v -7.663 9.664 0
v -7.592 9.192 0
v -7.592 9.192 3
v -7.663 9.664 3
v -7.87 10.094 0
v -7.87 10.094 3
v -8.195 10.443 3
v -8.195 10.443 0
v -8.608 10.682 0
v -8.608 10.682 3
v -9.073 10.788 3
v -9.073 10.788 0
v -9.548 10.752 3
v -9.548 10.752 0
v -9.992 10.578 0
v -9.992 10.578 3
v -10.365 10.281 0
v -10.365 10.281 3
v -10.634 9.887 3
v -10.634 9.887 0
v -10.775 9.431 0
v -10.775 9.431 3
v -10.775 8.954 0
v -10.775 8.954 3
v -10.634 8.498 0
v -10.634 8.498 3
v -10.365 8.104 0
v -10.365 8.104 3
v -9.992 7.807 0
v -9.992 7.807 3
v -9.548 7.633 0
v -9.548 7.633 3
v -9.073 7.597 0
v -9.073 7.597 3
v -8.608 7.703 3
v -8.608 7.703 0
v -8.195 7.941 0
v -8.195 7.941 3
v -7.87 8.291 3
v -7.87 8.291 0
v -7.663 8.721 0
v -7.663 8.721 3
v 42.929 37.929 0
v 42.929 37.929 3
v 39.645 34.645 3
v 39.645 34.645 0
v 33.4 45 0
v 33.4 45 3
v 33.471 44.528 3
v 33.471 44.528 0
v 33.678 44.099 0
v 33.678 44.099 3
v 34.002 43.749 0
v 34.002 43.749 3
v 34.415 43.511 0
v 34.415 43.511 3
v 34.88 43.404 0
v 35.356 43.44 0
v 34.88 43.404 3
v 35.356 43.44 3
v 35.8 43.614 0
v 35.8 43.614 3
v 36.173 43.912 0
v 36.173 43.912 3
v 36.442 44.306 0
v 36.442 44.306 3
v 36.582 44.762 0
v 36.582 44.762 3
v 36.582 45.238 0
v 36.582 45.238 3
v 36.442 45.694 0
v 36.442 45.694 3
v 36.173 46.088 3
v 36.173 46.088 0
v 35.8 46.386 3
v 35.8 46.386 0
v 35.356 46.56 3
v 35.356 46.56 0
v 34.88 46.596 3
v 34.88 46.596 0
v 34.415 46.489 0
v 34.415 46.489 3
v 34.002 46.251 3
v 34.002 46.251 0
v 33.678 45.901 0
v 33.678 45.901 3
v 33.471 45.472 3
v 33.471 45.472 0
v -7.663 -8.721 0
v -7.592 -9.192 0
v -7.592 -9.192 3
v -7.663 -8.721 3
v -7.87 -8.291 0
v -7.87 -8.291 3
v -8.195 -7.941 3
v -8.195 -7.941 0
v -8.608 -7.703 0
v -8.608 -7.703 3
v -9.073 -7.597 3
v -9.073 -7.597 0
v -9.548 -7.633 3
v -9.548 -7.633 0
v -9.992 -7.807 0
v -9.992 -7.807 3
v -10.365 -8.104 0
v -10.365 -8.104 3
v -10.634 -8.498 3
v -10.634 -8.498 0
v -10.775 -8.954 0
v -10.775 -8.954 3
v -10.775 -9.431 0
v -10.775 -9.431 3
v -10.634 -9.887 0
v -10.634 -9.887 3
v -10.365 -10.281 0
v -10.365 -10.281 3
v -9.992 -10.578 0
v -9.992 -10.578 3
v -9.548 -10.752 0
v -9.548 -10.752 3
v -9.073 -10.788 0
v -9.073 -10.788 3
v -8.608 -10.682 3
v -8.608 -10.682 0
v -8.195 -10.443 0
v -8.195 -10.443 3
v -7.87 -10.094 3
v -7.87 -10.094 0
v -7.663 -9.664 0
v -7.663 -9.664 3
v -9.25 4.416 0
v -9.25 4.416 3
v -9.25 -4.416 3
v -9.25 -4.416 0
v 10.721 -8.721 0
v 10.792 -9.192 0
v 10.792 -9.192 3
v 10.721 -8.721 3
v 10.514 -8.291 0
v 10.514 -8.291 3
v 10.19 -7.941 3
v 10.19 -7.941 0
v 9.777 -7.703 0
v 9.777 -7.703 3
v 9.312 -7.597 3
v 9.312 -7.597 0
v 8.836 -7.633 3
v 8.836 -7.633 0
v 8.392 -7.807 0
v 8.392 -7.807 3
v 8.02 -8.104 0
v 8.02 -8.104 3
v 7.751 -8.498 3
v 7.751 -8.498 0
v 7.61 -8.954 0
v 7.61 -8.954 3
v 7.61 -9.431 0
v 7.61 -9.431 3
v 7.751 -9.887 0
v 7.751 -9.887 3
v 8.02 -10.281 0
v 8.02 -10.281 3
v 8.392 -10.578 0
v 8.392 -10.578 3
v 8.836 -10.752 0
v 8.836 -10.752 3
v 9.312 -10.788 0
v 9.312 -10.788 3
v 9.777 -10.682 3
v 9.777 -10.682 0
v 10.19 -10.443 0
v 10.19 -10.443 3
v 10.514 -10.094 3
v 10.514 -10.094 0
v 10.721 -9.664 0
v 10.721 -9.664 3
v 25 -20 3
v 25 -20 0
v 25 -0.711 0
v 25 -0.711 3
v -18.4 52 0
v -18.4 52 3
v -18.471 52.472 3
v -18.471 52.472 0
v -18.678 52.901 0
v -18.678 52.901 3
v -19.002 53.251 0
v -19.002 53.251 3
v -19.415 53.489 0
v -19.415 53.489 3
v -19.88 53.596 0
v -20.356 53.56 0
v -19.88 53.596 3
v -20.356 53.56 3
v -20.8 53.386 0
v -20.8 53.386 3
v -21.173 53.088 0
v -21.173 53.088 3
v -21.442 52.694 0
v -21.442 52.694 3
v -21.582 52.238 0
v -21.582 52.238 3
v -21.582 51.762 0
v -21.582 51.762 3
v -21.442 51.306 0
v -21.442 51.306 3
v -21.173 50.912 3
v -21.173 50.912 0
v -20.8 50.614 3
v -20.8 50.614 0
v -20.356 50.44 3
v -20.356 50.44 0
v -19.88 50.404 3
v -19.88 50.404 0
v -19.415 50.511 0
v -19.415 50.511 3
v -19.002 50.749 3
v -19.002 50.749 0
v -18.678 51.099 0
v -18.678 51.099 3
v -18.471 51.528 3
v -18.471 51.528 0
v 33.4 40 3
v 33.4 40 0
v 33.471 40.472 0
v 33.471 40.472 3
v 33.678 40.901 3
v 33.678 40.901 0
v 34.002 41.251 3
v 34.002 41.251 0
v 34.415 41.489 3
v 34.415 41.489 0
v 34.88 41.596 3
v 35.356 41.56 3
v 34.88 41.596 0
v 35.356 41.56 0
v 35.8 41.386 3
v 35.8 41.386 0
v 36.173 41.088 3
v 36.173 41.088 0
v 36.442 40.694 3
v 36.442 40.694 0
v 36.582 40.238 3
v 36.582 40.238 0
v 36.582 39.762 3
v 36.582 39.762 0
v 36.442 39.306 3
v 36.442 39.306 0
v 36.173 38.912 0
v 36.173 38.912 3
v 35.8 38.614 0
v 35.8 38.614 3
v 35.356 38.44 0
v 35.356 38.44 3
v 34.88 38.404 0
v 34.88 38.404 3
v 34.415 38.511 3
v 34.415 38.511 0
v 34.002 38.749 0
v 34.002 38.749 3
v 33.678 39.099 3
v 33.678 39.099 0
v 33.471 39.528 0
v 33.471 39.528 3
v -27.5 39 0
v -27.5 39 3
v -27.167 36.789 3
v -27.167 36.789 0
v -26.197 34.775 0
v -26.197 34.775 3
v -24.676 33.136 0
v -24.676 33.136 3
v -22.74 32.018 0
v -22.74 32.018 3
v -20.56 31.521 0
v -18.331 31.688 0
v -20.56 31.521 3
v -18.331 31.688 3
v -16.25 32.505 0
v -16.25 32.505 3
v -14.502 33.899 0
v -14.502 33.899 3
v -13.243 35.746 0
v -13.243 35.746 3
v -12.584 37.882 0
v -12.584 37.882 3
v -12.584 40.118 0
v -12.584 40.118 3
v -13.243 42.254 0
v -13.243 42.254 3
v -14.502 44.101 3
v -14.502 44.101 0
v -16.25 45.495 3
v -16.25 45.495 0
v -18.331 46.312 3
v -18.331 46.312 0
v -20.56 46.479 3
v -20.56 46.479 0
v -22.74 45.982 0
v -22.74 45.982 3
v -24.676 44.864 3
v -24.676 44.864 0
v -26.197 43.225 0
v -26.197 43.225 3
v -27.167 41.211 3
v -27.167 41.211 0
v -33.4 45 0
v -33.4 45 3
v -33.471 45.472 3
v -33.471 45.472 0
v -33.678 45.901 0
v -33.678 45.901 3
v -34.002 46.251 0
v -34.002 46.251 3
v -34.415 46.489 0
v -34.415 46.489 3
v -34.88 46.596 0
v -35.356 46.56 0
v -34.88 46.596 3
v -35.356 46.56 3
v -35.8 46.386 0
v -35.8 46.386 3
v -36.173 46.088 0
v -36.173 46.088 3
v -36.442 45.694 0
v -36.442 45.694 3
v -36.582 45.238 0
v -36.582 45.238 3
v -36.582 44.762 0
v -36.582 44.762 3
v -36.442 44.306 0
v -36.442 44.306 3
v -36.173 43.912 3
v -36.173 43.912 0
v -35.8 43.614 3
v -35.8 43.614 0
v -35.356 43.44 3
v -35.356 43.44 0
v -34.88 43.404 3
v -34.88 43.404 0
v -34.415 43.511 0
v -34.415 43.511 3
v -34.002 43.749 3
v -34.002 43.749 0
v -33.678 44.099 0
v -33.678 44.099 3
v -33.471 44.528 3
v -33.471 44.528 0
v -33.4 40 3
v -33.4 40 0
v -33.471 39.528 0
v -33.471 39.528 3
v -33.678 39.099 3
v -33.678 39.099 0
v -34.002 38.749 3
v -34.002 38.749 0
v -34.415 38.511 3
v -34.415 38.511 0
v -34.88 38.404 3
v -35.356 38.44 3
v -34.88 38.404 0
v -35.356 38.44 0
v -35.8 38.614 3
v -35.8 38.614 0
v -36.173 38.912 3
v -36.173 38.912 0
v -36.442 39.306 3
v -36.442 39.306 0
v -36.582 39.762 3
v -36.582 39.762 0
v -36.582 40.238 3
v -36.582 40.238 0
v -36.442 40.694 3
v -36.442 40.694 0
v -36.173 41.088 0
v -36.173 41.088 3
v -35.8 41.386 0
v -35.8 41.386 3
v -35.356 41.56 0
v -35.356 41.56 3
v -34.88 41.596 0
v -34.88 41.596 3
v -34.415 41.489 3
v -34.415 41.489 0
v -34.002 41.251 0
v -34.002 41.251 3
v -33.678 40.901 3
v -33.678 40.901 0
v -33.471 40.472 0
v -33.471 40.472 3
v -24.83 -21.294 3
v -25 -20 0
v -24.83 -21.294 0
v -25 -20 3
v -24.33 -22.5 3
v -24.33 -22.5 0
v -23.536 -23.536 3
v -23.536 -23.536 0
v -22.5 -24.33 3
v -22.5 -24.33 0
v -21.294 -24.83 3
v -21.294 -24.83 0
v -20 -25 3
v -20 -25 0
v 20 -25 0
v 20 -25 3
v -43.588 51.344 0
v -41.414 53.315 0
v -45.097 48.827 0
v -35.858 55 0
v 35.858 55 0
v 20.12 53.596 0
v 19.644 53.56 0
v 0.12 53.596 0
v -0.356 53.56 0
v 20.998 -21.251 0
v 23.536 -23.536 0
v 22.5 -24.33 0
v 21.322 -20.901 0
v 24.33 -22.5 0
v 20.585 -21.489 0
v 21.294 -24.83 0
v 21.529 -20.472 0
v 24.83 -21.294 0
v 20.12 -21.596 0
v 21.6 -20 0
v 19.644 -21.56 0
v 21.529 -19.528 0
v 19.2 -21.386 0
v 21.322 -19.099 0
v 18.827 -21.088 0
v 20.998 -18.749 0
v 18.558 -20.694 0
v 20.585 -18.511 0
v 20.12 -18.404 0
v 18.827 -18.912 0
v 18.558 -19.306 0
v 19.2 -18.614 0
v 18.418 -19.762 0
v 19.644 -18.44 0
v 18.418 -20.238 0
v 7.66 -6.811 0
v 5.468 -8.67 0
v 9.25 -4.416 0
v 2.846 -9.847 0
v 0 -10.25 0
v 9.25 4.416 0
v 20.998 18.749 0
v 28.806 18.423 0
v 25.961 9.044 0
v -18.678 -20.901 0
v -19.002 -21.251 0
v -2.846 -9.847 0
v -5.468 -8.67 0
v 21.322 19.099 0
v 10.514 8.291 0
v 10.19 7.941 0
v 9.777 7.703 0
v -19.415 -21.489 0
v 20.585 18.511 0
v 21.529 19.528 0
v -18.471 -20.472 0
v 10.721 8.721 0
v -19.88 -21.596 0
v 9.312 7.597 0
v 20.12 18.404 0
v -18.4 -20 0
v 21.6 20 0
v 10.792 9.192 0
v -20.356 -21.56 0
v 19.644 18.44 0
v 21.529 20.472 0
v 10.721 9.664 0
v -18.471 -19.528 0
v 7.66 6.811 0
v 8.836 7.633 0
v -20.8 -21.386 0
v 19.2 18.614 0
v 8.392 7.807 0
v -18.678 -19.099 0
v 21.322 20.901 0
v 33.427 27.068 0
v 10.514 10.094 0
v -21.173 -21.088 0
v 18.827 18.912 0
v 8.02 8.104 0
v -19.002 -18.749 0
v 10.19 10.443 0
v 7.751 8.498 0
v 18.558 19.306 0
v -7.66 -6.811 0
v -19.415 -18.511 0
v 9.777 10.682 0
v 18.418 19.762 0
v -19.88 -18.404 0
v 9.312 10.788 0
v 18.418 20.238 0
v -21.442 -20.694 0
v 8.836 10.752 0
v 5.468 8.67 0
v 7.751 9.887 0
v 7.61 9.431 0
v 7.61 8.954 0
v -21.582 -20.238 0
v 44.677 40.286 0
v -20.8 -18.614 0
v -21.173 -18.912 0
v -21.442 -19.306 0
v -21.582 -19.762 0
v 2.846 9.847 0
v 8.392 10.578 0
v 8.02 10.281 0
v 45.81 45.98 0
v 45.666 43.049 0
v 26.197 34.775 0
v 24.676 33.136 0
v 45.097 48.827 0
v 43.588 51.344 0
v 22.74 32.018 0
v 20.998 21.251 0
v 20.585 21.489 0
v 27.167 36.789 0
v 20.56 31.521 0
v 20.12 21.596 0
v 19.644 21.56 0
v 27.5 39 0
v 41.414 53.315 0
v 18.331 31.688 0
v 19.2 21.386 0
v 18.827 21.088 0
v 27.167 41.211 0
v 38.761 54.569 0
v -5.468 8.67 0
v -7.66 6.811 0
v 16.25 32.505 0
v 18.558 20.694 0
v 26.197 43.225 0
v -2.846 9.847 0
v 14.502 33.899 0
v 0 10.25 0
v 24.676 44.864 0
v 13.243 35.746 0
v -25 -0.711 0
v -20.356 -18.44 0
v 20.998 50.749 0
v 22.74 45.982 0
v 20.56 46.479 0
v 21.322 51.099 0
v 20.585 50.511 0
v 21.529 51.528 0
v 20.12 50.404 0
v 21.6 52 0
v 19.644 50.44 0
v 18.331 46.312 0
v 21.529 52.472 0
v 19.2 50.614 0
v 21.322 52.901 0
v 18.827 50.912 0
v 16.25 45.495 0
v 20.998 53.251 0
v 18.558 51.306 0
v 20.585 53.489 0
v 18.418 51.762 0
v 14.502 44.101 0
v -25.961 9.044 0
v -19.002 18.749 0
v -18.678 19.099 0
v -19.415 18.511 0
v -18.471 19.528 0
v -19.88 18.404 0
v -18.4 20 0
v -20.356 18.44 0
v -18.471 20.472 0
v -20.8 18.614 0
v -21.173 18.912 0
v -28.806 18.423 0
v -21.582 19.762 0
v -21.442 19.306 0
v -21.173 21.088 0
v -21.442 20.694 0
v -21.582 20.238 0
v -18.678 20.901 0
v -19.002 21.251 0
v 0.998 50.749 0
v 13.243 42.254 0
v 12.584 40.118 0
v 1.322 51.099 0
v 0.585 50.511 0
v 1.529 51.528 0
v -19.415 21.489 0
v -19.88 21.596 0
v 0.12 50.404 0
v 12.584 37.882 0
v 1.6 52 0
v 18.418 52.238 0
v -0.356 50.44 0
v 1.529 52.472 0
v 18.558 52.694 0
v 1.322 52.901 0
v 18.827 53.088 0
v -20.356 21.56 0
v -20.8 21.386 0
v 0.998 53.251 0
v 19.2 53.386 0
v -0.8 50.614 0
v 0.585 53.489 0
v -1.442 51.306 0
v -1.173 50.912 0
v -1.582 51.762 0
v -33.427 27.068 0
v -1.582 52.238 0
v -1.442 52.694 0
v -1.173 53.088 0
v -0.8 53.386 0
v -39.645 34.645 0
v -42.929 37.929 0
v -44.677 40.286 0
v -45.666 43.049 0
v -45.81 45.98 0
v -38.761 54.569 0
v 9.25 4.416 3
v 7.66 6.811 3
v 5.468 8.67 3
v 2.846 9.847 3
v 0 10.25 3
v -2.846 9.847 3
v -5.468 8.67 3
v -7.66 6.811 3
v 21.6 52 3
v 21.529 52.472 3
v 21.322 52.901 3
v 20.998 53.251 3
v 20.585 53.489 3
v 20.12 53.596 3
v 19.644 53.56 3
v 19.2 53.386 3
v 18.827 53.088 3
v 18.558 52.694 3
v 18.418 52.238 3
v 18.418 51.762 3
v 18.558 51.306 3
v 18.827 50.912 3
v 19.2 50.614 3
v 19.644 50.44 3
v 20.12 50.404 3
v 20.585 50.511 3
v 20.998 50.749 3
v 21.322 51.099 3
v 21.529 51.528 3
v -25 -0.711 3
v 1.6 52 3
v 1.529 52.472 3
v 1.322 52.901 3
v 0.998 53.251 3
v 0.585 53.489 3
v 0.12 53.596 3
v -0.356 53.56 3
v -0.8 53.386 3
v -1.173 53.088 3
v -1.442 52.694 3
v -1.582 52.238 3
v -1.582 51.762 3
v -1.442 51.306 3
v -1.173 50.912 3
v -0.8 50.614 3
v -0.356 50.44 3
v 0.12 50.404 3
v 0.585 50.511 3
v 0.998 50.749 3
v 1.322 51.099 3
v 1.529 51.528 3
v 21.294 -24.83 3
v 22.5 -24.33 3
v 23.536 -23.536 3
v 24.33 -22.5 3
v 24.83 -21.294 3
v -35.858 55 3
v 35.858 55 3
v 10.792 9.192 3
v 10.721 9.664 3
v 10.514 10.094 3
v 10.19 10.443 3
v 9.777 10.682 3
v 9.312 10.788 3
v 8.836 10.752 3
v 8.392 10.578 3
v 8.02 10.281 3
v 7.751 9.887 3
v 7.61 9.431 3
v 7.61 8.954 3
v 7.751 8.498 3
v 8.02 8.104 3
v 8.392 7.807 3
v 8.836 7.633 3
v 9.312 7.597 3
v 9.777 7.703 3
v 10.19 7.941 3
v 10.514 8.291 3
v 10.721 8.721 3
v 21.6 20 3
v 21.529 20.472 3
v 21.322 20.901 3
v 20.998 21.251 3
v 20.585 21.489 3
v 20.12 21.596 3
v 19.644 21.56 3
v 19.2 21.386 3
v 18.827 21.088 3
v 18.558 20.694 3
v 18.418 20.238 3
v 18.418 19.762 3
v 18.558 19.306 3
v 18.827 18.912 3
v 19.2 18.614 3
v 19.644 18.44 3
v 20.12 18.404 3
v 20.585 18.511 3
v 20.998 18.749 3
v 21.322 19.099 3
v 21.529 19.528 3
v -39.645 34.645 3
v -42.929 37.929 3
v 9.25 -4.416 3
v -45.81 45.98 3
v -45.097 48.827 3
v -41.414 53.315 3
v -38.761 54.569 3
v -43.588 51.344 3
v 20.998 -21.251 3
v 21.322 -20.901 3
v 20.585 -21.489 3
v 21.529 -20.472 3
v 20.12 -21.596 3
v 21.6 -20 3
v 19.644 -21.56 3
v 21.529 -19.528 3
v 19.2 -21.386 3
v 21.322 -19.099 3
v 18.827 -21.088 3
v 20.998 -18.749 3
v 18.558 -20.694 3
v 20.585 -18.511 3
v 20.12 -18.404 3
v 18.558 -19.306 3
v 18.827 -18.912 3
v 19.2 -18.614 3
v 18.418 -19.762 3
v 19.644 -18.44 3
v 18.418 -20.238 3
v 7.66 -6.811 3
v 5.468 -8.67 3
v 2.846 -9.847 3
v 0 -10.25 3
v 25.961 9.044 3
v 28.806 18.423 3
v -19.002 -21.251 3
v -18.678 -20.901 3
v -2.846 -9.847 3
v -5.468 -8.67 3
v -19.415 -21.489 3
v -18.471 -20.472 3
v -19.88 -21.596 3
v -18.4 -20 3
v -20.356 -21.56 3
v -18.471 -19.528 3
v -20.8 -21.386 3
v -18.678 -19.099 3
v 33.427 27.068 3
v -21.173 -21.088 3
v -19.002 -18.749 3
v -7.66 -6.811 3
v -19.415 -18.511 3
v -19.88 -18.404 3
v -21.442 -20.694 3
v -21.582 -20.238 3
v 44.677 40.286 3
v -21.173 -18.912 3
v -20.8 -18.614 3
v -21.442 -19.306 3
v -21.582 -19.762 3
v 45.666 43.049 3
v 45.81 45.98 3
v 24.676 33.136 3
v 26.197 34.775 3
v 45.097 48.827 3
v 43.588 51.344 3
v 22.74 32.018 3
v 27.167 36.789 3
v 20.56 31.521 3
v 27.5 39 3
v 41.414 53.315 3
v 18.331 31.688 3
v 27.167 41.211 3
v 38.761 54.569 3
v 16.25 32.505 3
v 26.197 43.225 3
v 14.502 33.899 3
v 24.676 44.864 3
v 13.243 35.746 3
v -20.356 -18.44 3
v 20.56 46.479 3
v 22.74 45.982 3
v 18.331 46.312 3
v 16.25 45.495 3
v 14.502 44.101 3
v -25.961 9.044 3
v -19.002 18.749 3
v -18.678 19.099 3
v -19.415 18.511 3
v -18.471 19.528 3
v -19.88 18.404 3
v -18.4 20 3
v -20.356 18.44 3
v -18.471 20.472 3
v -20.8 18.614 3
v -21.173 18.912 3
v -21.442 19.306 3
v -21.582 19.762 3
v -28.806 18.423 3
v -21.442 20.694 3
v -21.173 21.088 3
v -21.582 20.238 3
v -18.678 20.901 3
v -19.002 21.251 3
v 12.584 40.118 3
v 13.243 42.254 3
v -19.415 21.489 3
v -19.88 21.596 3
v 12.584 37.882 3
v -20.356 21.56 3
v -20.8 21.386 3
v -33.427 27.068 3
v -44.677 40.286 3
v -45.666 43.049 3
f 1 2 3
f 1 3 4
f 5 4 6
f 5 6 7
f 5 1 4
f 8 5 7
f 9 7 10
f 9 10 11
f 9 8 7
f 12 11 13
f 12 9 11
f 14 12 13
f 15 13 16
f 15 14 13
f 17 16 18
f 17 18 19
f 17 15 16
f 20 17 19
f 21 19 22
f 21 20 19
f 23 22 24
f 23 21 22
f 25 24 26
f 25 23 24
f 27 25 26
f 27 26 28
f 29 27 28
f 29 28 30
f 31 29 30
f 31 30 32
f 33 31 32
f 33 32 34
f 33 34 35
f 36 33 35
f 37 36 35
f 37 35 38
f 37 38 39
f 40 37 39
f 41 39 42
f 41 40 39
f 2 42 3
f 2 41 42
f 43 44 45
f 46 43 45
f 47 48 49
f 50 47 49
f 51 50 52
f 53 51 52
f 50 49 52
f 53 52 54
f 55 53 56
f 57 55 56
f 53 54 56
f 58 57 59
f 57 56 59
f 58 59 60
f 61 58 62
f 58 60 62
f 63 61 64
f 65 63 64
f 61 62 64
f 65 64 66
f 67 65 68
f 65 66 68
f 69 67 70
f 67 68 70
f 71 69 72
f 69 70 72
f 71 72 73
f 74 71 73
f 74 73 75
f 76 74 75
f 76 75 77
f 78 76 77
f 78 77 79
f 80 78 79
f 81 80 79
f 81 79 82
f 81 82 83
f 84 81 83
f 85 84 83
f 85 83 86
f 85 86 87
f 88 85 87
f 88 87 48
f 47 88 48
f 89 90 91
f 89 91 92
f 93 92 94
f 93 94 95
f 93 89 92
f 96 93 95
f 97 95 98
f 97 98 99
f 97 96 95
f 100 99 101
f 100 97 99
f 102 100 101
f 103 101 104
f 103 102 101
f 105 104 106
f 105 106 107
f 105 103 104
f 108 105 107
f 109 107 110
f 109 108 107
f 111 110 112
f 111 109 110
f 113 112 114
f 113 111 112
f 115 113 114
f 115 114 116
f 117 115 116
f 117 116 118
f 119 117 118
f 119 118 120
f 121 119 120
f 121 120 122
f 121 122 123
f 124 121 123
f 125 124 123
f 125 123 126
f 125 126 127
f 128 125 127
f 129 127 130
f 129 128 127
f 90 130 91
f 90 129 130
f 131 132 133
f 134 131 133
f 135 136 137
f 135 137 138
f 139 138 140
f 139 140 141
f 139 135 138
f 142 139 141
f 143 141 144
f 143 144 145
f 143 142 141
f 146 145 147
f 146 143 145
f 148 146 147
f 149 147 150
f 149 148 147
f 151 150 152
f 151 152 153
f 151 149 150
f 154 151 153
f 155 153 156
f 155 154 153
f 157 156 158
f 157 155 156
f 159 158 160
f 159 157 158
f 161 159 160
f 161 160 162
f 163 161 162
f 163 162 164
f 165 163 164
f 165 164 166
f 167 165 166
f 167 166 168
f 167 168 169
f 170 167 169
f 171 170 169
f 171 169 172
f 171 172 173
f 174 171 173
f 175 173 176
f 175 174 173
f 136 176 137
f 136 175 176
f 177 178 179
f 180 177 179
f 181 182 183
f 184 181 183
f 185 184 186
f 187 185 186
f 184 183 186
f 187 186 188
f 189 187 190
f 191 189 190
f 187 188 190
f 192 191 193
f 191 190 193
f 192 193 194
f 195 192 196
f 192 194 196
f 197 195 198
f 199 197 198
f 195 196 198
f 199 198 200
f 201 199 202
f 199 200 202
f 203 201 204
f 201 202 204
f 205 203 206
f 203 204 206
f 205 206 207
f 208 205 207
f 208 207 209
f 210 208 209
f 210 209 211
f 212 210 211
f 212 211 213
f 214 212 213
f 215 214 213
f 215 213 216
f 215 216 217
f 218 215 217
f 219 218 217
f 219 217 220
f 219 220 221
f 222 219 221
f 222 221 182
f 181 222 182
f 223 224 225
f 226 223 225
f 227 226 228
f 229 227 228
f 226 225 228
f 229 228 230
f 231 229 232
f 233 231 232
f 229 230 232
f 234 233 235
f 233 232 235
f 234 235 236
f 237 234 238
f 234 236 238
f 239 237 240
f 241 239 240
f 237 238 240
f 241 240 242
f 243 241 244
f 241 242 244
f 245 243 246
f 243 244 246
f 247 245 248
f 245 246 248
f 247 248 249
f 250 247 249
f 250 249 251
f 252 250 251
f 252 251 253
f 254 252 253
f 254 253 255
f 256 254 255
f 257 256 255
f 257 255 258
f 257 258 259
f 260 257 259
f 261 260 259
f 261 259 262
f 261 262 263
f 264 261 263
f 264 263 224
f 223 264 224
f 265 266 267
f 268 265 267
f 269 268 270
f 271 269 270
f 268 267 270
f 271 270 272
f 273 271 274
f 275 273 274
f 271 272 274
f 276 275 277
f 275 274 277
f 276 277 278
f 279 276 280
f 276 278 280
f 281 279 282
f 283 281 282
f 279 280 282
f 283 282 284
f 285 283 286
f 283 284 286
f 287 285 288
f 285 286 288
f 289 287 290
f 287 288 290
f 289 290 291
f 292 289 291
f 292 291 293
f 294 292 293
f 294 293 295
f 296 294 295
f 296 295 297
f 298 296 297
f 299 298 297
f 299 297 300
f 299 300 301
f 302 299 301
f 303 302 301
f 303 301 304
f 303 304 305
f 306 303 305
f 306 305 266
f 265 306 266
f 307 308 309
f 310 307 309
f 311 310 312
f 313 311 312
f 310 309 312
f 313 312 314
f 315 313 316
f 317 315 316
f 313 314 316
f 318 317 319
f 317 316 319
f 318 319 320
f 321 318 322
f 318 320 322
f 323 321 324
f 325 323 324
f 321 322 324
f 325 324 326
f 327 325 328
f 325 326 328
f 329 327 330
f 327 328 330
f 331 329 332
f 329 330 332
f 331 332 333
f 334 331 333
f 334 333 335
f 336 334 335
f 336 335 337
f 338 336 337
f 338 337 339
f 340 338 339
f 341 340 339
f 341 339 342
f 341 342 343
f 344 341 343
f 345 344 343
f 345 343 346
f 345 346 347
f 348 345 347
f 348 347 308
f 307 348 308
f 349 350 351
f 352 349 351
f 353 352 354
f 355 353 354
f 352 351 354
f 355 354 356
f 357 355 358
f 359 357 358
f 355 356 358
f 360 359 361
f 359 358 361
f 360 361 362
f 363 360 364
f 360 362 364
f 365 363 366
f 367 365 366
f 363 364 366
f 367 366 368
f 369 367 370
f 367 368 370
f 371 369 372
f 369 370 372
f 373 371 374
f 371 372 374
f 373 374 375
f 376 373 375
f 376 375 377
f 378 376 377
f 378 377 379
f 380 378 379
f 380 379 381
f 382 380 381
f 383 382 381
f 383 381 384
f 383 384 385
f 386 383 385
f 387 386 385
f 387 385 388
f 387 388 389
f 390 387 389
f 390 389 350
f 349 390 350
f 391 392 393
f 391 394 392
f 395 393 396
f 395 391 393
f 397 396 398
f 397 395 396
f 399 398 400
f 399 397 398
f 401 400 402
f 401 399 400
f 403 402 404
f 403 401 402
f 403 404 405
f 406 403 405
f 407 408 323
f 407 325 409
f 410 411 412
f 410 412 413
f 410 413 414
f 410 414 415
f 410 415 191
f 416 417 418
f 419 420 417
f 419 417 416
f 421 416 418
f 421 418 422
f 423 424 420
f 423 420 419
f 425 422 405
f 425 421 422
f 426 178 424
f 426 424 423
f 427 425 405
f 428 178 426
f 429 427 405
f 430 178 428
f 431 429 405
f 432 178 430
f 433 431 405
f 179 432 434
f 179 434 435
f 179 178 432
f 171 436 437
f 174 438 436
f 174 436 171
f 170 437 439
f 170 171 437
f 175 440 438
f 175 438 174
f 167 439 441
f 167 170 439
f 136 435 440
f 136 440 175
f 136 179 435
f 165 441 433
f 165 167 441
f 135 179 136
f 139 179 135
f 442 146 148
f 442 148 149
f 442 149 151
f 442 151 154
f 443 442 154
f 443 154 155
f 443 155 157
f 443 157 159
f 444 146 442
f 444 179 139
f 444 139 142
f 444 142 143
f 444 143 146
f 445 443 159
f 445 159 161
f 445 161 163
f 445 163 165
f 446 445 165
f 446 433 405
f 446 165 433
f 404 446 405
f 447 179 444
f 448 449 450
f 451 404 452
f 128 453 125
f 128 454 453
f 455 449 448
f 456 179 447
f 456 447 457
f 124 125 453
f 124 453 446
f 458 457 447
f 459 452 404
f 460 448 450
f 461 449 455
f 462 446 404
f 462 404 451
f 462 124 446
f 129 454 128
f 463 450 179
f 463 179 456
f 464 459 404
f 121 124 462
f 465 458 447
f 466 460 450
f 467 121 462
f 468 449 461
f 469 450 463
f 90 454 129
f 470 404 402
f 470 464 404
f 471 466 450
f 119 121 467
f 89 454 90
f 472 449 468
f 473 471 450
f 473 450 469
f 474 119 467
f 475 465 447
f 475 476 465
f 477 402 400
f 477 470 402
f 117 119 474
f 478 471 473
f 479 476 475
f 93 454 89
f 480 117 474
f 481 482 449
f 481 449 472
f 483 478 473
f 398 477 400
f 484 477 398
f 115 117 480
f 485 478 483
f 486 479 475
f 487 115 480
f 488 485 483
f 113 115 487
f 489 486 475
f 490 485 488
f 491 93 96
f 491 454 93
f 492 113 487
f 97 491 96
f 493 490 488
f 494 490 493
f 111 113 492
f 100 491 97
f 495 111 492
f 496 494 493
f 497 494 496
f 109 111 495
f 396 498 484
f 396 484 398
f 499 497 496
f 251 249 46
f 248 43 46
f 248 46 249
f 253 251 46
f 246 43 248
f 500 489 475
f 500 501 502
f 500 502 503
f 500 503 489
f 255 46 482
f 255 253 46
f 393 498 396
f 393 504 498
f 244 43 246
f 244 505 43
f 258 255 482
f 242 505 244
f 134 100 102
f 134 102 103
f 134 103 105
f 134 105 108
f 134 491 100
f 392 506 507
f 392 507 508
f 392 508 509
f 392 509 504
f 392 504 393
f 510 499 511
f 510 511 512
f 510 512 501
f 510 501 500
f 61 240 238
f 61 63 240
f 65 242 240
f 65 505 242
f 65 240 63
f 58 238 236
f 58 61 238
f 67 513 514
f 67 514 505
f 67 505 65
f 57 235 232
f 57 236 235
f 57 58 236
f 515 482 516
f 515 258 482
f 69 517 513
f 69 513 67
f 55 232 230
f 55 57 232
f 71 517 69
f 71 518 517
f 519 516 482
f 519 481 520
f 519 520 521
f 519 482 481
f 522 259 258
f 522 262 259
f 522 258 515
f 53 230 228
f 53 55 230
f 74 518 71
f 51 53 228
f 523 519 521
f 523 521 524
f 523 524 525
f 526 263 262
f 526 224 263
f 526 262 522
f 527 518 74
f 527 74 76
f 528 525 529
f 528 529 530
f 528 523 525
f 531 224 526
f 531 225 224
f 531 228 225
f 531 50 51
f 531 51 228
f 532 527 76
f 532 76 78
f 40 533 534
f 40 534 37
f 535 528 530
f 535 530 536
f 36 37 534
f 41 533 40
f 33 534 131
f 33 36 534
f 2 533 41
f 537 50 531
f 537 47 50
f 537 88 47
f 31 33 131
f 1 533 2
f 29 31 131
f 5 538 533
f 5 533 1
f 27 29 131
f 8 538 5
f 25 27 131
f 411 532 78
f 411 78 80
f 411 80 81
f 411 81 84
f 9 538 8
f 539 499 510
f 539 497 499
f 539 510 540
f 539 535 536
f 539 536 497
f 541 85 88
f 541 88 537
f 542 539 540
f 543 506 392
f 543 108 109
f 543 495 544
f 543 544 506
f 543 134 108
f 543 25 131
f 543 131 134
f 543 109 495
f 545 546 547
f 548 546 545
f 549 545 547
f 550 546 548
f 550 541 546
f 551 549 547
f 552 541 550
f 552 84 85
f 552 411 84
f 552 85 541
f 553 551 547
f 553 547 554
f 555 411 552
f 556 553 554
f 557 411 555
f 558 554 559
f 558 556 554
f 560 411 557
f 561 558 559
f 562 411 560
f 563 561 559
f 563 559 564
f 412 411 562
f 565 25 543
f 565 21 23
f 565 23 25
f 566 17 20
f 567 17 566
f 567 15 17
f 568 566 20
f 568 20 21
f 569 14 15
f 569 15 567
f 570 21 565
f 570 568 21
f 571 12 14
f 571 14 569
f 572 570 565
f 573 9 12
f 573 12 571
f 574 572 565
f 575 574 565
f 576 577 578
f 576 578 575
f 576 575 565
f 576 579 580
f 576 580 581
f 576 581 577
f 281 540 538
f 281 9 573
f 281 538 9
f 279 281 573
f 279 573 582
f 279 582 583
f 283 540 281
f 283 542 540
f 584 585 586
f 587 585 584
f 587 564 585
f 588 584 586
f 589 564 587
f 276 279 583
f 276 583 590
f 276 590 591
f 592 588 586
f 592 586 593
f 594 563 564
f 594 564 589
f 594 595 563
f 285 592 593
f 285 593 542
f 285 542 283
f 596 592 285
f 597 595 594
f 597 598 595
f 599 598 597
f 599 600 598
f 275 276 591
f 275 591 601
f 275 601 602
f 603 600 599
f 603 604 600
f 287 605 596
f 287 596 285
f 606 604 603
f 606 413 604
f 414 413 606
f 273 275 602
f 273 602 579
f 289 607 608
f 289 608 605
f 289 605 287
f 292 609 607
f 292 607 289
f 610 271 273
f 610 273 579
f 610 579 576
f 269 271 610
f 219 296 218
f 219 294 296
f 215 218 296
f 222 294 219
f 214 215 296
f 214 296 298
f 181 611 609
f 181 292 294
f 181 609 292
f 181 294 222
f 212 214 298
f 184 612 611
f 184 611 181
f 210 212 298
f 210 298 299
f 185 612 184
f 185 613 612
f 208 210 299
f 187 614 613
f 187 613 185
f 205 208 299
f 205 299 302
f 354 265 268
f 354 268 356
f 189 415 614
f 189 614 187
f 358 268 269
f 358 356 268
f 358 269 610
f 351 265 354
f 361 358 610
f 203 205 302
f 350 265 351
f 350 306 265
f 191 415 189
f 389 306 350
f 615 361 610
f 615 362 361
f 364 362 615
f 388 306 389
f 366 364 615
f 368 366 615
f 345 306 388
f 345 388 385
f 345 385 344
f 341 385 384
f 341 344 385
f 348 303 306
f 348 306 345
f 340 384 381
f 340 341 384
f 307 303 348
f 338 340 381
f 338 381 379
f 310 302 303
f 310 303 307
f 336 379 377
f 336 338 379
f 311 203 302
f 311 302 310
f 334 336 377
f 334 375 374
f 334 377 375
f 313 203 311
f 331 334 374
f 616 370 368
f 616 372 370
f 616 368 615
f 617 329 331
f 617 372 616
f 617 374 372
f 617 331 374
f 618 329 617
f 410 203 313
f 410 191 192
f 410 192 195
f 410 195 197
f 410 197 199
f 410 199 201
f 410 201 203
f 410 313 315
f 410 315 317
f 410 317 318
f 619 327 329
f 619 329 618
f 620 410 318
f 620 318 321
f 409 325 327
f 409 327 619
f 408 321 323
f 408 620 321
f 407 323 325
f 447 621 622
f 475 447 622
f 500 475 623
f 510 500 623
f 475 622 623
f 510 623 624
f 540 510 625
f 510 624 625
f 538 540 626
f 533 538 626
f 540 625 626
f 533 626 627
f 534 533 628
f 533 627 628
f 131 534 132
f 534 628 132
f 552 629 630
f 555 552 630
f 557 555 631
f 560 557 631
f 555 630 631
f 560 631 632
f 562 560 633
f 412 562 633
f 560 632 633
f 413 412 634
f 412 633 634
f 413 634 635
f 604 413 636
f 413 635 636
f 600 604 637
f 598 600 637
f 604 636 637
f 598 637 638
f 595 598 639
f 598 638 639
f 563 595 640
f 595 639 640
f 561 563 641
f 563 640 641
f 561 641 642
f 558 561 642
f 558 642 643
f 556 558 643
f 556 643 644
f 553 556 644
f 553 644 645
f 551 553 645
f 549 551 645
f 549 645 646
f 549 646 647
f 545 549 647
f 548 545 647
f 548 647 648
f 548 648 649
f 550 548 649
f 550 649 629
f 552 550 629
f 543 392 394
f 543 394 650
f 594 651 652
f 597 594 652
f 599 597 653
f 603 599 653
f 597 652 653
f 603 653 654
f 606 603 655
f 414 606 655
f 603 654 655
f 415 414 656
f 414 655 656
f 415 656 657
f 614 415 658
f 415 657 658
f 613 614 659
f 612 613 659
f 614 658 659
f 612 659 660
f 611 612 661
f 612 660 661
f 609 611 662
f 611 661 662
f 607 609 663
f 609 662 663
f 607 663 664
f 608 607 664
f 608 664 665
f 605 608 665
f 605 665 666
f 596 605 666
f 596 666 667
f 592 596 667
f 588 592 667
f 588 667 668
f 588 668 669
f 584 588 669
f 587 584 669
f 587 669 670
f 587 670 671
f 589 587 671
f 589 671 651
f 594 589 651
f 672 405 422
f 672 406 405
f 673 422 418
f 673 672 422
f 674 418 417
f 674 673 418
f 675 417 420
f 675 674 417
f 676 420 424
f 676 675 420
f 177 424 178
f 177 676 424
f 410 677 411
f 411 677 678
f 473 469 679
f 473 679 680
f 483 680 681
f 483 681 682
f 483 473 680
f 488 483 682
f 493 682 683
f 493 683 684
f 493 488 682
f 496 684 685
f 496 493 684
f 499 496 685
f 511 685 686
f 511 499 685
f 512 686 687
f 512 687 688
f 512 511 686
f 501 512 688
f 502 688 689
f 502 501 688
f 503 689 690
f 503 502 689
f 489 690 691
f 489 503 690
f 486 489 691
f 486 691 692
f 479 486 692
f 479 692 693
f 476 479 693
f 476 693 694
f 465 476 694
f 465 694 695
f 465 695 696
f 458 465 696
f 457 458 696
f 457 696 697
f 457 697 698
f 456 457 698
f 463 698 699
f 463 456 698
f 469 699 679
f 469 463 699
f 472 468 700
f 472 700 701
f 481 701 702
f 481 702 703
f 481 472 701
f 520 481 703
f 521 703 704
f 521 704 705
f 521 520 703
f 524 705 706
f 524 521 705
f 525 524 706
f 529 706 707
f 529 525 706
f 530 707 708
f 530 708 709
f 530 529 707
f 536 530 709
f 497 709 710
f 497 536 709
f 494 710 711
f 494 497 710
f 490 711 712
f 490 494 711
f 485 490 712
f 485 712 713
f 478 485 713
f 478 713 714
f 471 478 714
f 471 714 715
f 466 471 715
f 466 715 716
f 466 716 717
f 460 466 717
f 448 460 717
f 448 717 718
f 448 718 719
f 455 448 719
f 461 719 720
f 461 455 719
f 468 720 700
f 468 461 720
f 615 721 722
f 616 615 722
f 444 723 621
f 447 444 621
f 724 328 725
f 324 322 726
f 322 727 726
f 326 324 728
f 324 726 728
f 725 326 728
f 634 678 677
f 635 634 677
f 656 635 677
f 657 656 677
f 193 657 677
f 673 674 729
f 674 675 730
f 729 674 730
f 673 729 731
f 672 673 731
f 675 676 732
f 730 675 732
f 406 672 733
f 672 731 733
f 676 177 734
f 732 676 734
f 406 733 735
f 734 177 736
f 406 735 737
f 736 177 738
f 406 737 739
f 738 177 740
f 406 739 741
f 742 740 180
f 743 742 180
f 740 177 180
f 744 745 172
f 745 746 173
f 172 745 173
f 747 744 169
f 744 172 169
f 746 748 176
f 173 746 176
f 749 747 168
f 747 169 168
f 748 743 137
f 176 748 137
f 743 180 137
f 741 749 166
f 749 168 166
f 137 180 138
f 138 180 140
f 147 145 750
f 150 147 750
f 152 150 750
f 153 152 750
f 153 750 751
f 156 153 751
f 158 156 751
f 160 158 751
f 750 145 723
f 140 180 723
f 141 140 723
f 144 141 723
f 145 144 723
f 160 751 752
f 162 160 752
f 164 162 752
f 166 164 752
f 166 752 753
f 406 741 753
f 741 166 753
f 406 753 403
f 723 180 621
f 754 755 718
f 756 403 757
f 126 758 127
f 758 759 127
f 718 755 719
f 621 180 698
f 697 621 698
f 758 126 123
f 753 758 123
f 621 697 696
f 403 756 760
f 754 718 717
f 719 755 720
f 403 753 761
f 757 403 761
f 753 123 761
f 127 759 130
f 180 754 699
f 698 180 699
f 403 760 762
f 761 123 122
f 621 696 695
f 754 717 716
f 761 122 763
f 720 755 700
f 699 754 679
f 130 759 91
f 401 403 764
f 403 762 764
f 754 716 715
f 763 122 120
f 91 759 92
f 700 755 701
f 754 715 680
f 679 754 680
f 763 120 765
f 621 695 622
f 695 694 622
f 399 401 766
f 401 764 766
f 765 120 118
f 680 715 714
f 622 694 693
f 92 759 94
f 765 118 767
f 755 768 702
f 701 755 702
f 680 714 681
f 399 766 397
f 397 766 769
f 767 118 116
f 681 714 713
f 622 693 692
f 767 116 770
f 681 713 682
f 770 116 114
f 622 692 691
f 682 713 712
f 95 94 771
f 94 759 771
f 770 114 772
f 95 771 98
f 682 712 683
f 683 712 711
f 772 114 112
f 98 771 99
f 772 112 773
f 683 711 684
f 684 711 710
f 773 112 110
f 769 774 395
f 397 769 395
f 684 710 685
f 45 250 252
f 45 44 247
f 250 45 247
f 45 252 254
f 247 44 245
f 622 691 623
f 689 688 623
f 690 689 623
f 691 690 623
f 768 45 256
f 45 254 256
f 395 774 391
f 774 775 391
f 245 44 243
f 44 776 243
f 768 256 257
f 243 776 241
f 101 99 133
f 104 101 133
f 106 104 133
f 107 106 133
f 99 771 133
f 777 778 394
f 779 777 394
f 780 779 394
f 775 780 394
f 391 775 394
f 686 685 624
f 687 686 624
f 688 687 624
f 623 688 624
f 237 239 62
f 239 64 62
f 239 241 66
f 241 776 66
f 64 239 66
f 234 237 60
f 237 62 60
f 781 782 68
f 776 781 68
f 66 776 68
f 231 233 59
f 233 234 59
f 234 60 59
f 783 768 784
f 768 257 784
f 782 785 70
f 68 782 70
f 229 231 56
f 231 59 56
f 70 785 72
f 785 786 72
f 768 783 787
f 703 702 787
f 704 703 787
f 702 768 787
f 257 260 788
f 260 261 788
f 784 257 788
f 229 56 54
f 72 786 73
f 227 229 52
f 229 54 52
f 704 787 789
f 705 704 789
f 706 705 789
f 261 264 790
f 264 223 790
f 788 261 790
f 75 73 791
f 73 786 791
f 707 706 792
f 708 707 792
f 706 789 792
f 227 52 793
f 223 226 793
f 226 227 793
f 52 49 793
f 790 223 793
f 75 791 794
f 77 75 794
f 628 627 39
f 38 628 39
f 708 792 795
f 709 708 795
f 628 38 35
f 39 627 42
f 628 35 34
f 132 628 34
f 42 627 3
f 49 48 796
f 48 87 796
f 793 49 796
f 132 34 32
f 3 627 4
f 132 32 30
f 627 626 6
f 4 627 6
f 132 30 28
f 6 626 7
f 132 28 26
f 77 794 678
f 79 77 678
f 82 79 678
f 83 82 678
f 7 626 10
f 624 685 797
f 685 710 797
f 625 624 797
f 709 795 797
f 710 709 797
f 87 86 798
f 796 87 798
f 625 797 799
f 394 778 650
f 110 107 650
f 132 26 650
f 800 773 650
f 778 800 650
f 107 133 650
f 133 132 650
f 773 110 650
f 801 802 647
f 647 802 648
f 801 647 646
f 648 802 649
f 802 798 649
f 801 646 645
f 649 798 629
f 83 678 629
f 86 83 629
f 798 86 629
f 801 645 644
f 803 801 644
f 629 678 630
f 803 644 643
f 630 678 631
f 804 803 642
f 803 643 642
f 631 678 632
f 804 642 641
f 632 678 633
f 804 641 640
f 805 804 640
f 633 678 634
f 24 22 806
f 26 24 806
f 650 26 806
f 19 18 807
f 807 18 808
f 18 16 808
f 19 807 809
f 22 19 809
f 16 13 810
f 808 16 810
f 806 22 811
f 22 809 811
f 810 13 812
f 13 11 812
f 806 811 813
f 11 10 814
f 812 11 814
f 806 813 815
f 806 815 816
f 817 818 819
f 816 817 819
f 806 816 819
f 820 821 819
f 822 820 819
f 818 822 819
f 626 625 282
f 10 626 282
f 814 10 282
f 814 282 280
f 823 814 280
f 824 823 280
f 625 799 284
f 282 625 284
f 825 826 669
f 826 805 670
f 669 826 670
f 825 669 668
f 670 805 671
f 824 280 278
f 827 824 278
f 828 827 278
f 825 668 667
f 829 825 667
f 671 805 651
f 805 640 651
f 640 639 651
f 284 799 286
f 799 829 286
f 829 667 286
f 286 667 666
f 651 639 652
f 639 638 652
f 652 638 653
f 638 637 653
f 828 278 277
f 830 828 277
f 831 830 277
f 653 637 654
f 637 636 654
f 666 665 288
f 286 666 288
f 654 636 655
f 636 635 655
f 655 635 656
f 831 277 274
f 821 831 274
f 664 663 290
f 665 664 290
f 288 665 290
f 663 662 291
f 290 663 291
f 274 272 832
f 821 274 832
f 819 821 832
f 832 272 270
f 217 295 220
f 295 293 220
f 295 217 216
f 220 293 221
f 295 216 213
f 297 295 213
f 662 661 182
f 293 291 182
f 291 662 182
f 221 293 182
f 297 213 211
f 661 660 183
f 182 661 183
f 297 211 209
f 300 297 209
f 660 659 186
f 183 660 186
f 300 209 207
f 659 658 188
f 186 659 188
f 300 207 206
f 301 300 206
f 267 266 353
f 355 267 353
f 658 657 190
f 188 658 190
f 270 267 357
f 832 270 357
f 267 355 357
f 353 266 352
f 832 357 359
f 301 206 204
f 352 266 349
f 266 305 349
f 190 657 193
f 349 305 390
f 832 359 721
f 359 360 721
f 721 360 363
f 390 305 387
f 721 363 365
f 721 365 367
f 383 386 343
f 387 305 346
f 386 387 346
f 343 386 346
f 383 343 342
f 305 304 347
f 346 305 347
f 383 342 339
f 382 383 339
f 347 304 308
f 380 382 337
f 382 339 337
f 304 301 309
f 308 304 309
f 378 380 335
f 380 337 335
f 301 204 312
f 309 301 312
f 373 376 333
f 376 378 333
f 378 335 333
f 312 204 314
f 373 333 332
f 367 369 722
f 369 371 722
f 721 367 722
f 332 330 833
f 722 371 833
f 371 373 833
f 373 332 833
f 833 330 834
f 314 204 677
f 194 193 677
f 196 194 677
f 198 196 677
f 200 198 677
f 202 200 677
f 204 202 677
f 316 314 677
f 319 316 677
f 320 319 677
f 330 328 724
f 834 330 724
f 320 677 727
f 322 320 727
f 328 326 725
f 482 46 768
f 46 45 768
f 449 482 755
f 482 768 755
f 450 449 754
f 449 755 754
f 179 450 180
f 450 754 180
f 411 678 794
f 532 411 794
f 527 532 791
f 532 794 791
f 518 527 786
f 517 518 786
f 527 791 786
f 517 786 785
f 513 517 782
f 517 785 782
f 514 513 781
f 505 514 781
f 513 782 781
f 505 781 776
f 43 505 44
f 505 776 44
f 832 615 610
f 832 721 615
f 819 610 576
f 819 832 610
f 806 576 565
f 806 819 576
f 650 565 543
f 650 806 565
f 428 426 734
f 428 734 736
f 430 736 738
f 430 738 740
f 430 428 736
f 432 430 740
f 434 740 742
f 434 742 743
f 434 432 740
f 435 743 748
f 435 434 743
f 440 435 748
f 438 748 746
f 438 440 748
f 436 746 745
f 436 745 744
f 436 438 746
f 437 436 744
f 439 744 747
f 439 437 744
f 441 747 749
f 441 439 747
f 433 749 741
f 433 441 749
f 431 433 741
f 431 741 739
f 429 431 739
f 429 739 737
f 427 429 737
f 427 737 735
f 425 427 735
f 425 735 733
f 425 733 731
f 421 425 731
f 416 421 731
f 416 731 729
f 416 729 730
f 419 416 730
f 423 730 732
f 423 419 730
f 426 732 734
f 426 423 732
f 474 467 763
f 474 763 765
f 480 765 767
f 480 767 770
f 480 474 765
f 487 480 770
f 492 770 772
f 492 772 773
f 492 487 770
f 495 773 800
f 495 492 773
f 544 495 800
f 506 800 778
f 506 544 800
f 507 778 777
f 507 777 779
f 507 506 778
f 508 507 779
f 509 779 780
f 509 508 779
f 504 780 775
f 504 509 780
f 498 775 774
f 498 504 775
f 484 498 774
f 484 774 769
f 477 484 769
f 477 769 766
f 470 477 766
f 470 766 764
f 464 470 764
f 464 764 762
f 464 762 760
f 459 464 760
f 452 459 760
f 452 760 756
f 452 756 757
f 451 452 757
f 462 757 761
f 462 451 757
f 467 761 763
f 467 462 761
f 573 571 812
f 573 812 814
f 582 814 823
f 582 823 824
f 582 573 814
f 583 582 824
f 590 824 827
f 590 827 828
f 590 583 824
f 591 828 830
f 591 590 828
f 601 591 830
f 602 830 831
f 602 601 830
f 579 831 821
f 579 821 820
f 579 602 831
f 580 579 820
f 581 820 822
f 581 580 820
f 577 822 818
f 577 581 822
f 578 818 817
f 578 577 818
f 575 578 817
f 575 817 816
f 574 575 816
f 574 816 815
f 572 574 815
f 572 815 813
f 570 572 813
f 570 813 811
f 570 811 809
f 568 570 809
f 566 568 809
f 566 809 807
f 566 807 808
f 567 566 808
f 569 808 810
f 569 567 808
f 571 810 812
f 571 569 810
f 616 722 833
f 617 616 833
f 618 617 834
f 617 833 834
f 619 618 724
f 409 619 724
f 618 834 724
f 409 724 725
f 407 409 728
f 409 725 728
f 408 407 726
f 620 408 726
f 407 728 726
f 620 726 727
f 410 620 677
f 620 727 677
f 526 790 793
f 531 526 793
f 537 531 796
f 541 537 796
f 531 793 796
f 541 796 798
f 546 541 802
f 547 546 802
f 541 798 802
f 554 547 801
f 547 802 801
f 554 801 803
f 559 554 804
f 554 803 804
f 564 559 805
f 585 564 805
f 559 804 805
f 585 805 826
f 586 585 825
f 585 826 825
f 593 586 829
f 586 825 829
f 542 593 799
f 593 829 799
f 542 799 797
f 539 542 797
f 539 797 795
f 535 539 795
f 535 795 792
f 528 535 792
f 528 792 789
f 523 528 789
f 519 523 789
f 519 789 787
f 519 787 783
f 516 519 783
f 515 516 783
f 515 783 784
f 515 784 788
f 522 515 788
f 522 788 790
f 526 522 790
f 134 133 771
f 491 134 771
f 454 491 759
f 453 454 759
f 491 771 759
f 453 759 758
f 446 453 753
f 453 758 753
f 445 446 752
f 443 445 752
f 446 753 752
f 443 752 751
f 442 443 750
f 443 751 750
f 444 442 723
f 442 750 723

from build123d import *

# Parameters (mm, degrees)
SKETCH_1_W          = 50
SKETCH_1_H          = 50
SKETCH_1_R          = 1.6
EXTRUDE_1_DEPTH     = 3
FILLET_1_R          = 5
CUT_EXTRUDE_1_DEPTH = 36.482389998
EXTRUDE_2_DEPTH     = 3
FILLET_2_R          = 50
SKETCH_4_R          = 1.6
CUT_EXTRUDE_2_DEPTH = 72.672475366
SKETCH_5_R          = 7.5
CUT_EXTRUDE_3_DEPTH = 72.672475366
SKETCH_6_R          = 1.6
CUT_EXTRUDE_4_DEPTH = 72.672475366
SKETCH_7_R          = 1.6
CUT_EXTRUDE_5_DEPTH = 72.672475366


with BuildPart() as part:
    # ｽｹｯﾁ1 → ﾎﾞｽ - 押し出し1 (new body)
    with BuildSketch(Plane.XY):
        Rectangle(SKETCH_1_W, SKETCH_1_H)
        with Locations((-20, 20)):
            Circle(SKETCH_1_R, mode=Mode.SUBTRACT)
        with Locations((-9.192388155, 9.192388155)):
            Circle(SKETCH_1_R, mode=Mode.SUBTRACT)
        with Locations((9.192388155, 9.192388155)):
            Circle(SKETCH_1_R, mode=Mode.SUBTRACT)
        with Locations((20, 20)):
            Circle(SKETCH_1_R, mode=Mode.SUBTRACT)
        with Locations((9.192388155, -9.192388155)):
            Circle(SKETCH_1_R, mode=Mode.SUBTRACT)
        with Locations((20, -20)):
            Circle(SKETCH_1_R, mode=Mode.SUBTRACT)
        with Locations((-9.192388155, -9.192388155)):
            Circle(SKETCH_1_R, mode=Mode.SUBTRACT)
        with Locations((-20, -20)):
            Circle(SKETCH_1_R, mode=Mode.SUBTRACT)
    extrude(amount=EXTRUDE_1_DEPTH)

    # ﾌｨﾚｯﾄ1
    fillet_1_edges = [part.edges().sort_by_distance(p)[0] for p in [
        (25, -25, 1.5),
        (-25, -25, 1.5),
        (-25, 25, 1.5),
        (25, 25, 1.5),
    ]]
    fillet(fillet_1_edges, radius=FILLET_1_R)

    # ｽｹｯﾁ2 → ｶｯﾄ - 押し出し1 (cut, through all)
    with BuildSketch(Plane.XY.offset(3)):
        with BuildLine():
            Line((-9.25, 4.415880433), (-9.25, -4.415880433))
            ThreePointArc((-9.25, -4.415880433), (0, -10.25), (9.25, -4.415880433))
            Line((9.25, -4.415880433), (9.25, 4.415880433))
            ThreePointArc((9.25, 4.415880433), (0, 10.25), (-9.25, 4.415880433))
        make_face()
    extrude(amount=-CUT_EXTRUDE_1_DEPTH, mode=Mode.SUBTRACT)

    # ｽｹｯﾁ3 → ﾎﾞｽ - 押し出し2 (add, through all)
    with BuildSketch(Plane.XY.offset(3)):
        with BuildLine():
            Line((-25, 20), (-42.928932188, 37.928932188))
            ThreePointArc((-42.928932188, 37.928932188), (-45.096659701, 48.826834324), (-35.857864376, 55))
            Line((-35.857864376, 55), (35.857864376, 55))
            ThreePointArc((35.857864376, 55), (45.096659701, 48.826834324), (42.928932188, 37.928932188))
            Line((42.928932188, 37.928932188), (25, 20))
            ThreePointArc((25, 20), (23.535533906, 23.535533906), (20, 25))
            Line((20, 25), (-20, 25))
            ThreePointArc((-20, 25), (-23.535533906, 23.535533906), (-25, 20))
        make_face()
    extrude(amount=-EXTRUDE_2_DEPTH)

    # ﾌｨﾚｯﾄ2
    fillet_2_edges = [part.edges().sort_by_distance(p)[0] for p in [
        (25, 20, 1.5),
        (-25, 20, 1.5),
    ]]
    fillet(fillet_2_edges, radius=FILLET_2_R)

    # ｽｹｯﾁ4 → ｶｯﾄ - 押し出し2 (cut, through all)
    with BuildSketch(Plane.XY.offset(3)):
        with Locations((-35, 45)):
            Circle(SKETCH_4_R)
        with Locations(Location((35, 45, 0), (0, 0, 180))):
            Circle(SKETCH_4_R)
    extrude(amount=-CUT_EXTRUDE_2_DEPTH, mode=Mode.SUBTRACT)

    # ｽｹｯﾁ5 → ｶｯﾄ - 押し出し3 (cut, through all)
    with BuildSketch(Plane.XY.offset(3)):
        with Locations((20, 39)):
            Circle(SKETCH_5_R)
        with Locations(Location((-20, 39, 0), (0, 0, 180))):
            Circle(SKETCH_5_R)
    extrude(amount=-CUT_EXTRUDE_3_DEPTH, mode=Mode.SUBTRACT)

    # ｽｹｯﾁ6 → ｶｯﾄ - 押し出し4 (cut, through all)
    with BuildSketch(Plane(origin=(0, 0, 0), x_dir=(-1, 0, 0), z_dir=(0, 0, -1))):
        with Locations((-35, 40)):
            Circle(SKETCH_6_R)
        with Locations(Location((35, 40, 0), (0, 0, 180))):
            Circle(SKETCH_6_R)
    extrude(amount=-CUT_EXTRUDE_4_DEPTH, mode=Mode.SUBTRACT)

    # ｽｹｯﾁ7 → ｶｯﾄ - 押し出し5 (cut, through all)
    with BuildSketch(Plane.XY.offset(3)):
        with Locations((0, 52)):
            Circle(SKETCH_7_R)
        with Locations((20, 52)):
            Circle(SKETCH_7_R)
        with Locations((-20, 52)):
            Circle(SKETCH_7_R)
    extrude(amount=-CUT_EXTRUDE_5_DEPTH, mode=Mode.SUBTRACT)


solid = part.part
